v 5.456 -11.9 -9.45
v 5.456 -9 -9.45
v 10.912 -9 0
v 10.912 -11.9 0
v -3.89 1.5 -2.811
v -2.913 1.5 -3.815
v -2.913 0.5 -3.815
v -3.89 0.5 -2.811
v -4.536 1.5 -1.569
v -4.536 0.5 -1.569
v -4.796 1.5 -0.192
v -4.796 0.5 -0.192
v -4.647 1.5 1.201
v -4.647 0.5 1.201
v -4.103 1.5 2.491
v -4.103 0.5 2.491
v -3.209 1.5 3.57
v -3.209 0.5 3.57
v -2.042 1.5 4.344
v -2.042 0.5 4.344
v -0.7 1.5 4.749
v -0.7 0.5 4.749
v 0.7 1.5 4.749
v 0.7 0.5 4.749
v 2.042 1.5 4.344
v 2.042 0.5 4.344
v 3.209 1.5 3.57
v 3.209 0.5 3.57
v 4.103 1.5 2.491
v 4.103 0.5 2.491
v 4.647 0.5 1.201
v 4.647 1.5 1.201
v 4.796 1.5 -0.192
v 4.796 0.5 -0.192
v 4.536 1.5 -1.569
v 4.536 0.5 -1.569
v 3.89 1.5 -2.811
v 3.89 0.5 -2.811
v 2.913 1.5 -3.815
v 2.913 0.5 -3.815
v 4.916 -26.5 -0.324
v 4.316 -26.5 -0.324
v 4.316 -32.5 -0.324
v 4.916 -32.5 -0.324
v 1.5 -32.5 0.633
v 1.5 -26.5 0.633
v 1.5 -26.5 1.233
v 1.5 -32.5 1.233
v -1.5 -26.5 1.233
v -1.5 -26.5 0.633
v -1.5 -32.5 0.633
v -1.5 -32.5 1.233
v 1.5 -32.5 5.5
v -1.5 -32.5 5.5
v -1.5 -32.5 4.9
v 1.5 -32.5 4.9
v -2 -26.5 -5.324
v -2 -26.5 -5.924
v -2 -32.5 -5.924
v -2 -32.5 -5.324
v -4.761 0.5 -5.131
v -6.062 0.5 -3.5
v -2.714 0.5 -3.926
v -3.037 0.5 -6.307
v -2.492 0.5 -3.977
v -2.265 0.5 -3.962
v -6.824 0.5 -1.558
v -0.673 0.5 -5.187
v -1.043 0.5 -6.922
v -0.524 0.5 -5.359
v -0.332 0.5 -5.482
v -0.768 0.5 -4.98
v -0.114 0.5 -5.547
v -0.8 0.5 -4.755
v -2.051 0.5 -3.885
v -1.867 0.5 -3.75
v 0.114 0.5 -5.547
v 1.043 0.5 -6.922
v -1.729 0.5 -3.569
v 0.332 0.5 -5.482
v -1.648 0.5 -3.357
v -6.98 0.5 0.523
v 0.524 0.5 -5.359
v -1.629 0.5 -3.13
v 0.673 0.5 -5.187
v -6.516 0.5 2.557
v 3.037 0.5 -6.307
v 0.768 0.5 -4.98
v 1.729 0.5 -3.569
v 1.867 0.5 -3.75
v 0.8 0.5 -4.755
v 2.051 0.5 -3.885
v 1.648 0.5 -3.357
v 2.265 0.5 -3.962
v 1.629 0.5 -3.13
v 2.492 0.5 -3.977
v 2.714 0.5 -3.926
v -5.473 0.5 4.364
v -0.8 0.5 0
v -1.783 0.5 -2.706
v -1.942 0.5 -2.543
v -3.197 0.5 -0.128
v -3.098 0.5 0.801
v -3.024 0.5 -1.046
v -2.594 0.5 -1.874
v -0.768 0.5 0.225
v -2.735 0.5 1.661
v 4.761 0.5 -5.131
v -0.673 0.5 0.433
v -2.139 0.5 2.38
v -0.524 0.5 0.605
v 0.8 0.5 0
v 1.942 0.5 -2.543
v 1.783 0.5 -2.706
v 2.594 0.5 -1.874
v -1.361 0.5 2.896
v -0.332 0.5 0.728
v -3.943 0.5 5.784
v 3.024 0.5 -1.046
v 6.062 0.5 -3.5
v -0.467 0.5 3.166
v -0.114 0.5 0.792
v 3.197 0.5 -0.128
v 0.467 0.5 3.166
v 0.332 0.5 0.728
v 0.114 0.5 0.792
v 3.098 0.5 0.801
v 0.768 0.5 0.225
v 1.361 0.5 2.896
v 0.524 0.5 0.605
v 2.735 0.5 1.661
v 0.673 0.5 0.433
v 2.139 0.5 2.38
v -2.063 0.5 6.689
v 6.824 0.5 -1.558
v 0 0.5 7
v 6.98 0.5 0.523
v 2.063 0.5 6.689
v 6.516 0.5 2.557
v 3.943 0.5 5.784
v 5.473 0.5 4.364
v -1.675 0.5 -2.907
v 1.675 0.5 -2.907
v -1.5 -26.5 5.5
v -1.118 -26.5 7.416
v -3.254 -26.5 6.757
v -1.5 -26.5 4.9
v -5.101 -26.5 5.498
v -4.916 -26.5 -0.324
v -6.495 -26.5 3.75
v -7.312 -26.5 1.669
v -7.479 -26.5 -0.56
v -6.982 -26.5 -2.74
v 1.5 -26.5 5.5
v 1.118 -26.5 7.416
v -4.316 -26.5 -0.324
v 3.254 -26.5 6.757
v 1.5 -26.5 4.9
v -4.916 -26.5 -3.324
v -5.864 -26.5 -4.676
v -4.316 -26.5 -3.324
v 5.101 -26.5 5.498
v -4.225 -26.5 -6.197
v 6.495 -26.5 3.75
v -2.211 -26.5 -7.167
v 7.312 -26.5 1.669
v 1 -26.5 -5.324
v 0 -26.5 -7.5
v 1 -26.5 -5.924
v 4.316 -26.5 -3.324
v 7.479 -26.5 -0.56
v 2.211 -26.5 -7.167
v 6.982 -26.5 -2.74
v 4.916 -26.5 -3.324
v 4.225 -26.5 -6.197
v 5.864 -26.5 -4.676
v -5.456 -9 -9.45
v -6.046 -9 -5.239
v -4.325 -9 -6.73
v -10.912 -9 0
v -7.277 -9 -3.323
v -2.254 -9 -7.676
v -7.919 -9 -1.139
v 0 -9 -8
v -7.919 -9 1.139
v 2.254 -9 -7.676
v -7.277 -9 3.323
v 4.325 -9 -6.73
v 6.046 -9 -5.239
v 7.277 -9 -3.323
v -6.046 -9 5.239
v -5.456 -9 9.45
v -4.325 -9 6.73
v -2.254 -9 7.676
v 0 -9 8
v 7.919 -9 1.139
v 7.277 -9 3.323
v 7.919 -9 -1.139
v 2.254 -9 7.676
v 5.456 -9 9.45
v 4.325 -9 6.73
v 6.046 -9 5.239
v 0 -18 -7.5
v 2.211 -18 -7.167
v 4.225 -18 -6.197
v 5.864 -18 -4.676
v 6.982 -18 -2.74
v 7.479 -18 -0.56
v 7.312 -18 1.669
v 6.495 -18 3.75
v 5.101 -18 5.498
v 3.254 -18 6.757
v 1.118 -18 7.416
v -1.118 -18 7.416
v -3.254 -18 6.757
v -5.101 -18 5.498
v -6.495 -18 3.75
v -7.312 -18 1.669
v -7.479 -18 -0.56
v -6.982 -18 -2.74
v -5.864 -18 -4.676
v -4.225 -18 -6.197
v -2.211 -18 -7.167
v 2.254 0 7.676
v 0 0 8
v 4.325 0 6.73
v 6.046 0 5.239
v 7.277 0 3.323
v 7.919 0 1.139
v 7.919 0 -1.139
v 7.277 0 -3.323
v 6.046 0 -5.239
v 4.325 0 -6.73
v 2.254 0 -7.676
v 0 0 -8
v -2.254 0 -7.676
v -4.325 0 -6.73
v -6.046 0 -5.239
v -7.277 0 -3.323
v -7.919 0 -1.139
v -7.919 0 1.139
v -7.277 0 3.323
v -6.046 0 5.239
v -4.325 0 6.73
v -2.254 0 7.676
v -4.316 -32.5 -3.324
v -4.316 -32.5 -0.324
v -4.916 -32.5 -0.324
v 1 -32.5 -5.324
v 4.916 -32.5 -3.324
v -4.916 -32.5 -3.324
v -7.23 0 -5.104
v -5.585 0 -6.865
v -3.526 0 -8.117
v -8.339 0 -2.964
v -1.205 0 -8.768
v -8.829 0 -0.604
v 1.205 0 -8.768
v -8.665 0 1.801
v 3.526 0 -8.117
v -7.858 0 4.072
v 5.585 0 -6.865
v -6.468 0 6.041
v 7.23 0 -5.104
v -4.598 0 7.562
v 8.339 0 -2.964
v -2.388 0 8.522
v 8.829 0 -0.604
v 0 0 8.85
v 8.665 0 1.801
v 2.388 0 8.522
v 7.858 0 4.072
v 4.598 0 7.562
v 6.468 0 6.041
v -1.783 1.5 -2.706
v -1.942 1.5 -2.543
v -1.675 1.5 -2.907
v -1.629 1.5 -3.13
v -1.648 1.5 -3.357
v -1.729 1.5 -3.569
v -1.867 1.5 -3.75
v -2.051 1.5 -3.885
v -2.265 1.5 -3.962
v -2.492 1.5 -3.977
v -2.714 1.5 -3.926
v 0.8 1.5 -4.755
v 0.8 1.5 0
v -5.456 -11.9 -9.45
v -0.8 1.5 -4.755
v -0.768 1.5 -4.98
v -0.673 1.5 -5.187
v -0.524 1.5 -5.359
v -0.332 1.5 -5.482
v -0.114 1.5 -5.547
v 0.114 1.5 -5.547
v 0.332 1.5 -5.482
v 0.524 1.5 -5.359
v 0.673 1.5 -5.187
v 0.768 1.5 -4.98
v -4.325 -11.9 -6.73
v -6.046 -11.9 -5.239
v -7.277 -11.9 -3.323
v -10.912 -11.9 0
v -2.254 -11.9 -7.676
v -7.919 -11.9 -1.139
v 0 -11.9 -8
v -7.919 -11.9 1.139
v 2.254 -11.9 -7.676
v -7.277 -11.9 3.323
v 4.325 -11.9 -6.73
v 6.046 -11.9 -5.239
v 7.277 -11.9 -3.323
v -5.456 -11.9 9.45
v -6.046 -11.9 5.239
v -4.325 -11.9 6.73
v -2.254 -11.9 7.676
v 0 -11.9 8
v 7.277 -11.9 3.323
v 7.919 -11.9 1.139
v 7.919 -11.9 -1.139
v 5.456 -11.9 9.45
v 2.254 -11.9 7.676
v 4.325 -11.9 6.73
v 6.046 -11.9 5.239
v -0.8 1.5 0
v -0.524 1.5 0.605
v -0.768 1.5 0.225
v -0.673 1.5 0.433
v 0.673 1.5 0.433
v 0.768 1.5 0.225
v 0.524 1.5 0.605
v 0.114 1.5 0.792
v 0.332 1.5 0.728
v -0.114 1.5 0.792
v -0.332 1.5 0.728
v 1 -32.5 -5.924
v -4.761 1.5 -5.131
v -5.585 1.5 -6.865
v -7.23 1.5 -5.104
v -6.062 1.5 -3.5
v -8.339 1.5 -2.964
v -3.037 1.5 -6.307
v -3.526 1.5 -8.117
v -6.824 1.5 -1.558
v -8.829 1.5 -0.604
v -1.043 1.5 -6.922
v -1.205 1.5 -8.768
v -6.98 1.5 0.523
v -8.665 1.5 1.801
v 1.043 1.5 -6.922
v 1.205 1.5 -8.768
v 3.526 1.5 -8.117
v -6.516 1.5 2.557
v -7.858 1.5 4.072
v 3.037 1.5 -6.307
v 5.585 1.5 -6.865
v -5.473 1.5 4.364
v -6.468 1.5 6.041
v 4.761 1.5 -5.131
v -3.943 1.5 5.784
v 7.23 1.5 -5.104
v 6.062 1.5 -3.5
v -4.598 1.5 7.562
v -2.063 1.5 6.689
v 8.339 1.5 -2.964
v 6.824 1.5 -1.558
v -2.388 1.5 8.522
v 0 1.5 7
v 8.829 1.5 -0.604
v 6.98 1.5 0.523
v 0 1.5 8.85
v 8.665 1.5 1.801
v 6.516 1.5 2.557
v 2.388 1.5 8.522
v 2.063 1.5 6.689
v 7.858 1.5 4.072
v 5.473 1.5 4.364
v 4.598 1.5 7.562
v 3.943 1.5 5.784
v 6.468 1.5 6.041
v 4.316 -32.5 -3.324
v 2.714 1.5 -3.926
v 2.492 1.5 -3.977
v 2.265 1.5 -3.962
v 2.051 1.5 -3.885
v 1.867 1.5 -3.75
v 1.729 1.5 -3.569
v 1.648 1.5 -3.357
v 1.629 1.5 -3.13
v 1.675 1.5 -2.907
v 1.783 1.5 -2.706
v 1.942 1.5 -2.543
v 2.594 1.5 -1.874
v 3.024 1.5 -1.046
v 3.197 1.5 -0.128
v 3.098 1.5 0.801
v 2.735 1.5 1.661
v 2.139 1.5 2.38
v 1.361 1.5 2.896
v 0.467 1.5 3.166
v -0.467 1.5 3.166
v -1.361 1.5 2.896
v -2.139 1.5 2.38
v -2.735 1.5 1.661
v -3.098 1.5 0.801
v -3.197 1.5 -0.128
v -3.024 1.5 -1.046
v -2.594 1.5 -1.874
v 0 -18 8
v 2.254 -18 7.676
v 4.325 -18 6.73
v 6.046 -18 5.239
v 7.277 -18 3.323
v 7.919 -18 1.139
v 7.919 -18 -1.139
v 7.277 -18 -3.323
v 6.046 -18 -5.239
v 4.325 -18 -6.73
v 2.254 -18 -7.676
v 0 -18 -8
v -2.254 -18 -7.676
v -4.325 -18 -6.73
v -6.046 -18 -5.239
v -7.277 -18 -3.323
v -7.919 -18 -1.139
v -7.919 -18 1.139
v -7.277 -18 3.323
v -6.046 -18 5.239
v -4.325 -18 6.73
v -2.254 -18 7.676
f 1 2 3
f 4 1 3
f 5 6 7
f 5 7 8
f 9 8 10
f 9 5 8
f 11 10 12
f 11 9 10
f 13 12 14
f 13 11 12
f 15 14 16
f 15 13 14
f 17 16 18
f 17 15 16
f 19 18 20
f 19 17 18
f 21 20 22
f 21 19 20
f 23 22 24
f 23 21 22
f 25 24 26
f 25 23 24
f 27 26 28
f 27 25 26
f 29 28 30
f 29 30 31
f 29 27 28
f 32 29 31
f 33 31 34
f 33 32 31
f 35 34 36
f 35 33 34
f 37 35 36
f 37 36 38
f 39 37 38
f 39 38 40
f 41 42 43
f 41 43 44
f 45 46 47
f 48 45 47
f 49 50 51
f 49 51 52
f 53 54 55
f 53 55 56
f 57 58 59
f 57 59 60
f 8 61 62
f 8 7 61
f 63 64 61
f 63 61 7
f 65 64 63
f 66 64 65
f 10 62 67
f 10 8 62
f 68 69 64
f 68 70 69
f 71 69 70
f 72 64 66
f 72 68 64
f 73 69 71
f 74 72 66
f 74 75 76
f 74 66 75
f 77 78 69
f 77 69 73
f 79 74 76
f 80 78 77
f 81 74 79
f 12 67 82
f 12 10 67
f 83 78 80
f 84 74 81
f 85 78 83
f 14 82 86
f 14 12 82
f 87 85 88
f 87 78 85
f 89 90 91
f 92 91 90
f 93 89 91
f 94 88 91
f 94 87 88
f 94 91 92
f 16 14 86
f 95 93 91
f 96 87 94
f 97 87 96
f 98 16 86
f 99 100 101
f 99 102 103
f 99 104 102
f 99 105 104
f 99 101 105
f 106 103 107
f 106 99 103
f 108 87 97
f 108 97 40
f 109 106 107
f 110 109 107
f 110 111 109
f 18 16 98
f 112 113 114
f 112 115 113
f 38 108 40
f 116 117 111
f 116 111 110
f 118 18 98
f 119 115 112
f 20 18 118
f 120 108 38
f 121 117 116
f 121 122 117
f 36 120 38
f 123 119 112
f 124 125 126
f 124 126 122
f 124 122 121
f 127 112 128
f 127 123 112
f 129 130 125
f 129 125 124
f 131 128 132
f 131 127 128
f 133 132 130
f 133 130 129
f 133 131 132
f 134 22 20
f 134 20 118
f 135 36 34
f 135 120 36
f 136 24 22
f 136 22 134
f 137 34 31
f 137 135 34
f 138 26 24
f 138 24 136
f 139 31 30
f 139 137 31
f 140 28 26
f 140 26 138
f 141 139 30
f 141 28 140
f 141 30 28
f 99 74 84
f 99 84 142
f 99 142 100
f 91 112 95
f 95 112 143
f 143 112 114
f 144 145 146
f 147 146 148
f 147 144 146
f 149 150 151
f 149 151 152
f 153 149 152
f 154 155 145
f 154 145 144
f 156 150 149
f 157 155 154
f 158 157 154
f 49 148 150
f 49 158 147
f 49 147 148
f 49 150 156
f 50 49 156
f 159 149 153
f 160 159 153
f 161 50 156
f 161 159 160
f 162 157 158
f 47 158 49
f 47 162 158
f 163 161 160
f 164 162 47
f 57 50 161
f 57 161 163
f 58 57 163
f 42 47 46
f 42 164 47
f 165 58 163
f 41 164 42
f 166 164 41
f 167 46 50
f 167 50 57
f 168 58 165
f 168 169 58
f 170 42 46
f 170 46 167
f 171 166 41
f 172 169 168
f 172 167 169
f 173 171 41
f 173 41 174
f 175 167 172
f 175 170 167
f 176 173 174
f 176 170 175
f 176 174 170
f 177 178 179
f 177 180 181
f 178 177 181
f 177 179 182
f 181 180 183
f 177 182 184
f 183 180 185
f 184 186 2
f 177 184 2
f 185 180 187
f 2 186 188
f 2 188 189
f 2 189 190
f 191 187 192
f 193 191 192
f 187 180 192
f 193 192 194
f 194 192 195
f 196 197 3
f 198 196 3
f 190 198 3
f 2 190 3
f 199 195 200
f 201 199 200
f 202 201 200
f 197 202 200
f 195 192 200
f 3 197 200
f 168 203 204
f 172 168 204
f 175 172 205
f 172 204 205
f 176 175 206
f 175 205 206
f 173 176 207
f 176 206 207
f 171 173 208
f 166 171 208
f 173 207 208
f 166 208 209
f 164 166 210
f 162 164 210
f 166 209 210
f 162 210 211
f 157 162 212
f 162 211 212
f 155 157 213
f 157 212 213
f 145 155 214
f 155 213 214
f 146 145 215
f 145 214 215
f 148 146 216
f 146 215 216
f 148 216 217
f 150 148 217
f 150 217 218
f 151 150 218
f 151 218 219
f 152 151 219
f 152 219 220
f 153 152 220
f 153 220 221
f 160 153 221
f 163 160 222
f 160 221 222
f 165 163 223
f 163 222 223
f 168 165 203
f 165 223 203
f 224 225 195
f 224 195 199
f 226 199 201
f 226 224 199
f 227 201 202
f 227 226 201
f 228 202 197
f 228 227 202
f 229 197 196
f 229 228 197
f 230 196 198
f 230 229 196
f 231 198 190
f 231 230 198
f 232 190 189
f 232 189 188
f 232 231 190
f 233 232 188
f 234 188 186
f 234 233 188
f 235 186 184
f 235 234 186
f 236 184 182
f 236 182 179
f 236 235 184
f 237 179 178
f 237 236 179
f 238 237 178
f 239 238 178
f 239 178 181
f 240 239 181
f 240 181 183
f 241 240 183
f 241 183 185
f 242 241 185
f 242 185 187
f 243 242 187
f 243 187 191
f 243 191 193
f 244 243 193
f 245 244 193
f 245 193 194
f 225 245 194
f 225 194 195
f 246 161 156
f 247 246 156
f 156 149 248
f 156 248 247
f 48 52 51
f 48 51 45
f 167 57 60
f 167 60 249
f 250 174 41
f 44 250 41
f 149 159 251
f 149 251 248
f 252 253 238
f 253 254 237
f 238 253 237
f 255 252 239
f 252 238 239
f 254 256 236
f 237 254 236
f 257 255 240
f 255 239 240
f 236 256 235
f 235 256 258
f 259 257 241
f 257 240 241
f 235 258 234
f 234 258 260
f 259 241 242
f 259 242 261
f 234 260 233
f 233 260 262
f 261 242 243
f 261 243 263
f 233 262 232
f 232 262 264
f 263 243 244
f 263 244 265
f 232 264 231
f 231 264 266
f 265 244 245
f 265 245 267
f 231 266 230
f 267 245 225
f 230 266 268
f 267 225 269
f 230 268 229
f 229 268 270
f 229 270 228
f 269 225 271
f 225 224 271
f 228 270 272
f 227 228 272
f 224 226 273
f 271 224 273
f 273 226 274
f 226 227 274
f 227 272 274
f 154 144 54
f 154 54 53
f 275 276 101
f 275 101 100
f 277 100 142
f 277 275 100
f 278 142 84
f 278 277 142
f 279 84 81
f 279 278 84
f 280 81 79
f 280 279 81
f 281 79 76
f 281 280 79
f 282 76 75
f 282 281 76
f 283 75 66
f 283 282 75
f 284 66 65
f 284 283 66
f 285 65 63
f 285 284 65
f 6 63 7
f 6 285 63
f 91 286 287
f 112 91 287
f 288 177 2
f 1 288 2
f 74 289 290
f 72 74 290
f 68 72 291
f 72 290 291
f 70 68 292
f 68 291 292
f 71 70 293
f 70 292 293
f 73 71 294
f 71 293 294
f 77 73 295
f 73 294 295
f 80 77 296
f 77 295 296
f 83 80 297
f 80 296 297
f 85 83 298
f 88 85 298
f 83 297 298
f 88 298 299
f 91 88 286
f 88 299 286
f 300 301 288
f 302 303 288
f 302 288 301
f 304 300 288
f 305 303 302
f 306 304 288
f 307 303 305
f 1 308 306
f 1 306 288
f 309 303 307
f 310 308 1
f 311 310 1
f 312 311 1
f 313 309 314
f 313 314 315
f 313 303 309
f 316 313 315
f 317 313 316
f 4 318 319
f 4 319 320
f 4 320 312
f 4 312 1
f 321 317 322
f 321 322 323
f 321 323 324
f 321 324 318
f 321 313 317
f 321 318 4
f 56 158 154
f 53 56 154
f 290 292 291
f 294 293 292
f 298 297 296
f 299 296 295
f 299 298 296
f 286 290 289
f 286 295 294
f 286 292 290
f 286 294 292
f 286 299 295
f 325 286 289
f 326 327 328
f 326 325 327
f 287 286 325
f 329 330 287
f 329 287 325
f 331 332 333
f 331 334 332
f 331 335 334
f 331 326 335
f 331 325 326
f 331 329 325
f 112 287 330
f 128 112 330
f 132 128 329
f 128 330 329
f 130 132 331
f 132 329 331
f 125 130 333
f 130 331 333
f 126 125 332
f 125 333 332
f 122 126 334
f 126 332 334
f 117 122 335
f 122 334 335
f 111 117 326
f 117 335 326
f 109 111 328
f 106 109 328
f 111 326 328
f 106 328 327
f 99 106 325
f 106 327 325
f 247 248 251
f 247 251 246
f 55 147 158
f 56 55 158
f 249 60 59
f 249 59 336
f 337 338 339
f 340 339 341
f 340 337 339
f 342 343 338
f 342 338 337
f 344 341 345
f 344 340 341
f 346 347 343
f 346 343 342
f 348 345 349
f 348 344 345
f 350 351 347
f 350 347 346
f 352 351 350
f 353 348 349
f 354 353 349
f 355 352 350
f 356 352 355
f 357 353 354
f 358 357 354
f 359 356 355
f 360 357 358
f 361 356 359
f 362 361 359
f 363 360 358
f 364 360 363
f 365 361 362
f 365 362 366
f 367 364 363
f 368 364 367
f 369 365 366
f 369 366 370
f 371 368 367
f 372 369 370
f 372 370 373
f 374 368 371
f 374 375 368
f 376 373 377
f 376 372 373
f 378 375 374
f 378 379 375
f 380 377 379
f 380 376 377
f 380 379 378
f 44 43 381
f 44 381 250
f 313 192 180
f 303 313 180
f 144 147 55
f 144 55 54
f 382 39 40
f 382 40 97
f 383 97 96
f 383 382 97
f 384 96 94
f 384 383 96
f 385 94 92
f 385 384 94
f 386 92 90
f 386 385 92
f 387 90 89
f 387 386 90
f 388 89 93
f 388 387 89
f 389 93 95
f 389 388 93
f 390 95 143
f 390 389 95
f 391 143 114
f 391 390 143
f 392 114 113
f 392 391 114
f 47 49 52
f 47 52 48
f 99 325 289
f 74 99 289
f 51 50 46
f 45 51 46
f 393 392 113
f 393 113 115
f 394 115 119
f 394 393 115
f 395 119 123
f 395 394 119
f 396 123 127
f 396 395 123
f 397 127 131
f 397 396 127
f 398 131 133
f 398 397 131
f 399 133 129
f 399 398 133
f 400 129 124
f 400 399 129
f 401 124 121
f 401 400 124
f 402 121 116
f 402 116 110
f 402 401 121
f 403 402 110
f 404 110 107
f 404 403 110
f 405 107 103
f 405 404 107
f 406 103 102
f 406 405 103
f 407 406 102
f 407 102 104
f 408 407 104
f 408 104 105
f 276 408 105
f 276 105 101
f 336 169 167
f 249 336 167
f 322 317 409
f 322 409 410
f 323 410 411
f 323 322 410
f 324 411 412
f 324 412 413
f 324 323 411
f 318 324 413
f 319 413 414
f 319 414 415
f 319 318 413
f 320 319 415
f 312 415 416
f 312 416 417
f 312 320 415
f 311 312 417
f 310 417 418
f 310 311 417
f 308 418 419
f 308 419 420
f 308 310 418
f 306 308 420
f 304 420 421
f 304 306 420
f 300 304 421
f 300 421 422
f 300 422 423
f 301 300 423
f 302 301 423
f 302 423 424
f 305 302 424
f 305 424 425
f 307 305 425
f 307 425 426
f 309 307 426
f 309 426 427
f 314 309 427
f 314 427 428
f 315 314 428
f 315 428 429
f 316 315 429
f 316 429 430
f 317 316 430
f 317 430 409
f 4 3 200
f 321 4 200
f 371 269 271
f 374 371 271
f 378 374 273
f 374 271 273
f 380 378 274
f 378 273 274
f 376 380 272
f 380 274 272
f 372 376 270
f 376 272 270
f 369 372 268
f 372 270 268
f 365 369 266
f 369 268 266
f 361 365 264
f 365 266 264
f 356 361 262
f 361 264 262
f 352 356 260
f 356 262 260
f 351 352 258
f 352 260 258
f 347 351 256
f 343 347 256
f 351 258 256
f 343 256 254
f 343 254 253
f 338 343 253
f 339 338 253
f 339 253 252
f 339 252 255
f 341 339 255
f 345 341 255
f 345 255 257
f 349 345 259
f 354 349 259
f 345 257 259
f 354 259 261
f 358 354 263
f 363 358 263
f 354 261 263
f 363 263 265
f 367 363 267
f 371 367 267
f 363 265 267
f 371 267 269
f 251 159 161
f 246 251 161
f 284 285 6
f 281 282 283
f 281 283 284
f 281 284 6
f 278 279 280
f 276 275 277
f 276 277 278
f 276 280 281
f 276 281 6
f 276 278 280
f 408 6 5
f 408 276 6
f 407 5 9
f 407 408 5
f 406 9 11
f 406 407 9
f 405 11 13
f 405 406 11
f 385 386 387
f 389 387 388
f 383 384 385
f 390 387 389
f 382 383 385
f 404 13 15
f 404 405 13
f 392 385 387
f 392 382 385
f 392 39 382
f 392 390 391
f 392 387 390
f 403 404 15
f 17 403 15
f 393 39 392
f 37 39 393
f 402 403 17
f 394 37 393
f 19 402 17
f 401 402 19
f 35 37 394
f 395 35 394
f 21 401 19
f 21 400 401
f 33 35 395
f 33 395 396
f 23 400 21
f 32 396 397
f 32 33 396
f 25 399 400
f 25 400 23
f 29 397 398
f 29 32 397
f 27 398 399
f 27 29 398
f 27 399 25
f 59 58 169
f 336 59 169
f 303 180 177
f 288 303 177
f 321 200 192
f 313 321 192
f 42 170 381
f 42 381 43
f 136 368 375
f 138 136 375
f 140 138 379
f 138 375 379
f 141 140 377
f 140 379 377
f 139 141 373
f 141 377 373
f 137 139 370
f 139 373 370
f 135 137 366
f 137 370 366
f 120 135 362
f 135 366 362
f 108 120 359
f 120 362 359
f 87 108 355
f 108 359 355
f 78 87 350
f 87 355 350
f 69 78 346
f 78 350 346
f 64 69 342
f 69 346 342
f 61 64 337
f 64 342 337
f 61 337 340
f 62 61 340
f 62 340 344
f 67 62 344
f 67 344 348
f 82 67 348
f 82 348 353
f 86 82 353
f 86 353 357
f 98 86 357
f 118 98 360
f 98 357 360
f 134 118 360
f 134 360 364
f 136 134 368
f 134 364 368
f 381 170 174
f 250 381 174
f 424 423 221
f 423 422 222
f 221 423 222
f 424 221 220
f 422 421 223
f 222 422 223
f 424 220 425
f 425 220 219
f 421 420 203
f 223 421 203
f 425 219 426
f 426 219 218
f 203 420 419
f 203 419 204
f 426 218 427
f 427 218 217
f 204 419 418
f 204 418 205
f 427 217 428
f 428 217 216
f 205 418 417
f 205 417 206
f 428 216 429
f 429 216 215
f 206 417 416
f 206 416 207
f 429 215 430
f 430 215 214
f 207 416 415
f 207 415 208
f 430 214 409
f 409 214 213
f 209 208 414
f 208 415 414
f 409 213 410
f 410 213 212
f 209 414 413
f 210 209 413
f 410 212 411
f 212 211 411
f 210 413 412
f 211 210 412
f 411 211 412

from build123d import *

# Parameters (mm, degrees)
ESQUISSE1_R             = 8
BOSS_EXTRU_1_DEPTH      = 18
ESQUISSE2_R             = 8.85
BOSS_EXTRU_2_DEPTH      = 1.5
ESQUISSE3_R             = 7
ENL_V_MAT_EXTRU_1_DEPTH = 1
ESQUISSE4_R             = 7.5
BOSS_EXTRU_3_DEPTH      = 8.5
ESQUISSE5_W             = 0.6
ESQUISSE5_H             = 3
ESQUISSE5_W_2           = 3
ESQUISSE5_H_2           = 0.6
BOSS_EXTRU_4_DEPTH      = 6
BOSS_EXTRU_5_START      = 9
BOSS_EXTRU_5_DEPTH      = 2.9


with BuildPart() as part:
    # Esquisse1 → Boss.-Extru.1 (new body)
    with BuildSketch(Plane(origin=(0, 0, 0), x_dir=(1, 0, 0), z_dir=(0, 1, 0))):
        with Locations(Location((0, 0, 0), (0, 0, 270))):
            Circle(ESQUISSE1_R)
    extrude(amount=-BOSS_EXTRU_1_DEPTH)

    # Esquisse2 → Boss.-Extru.2 (add)
    with BuildSketch(Plane(origin=(0, 0, 0), x_dir=(1, 0, 0), z_dir=(0, 1, 0))):
        with Locations(Location((0, 0, 0), (0, 0, 270))):
            Circle(ESQUISSE2_R)
    extrude(amount=BOSS_EXTRU_2_DEPTH)

    # Esquisse3 → Enlèv. mat.-Extru.1 (cut)
    with BuildSketch(Plane(origin=(0, 1.5, 0), x_dir=(1, 0, 0), z_dir=(0, 1, 0))):
        with Locations(Location((0, 0, 0), (0, 0, 270))):
            Circle(ESQUISSE3_R)
        with BuildLine():
            Line((-0.8, 0), (-0.8, 4.75466628))
            ThreePointArc((-0.8, 4.75466628), (0, 5.55466628), (0.8, 4.75466628))
            Line((0.8, 4.75466628), (0.8, 0))
            ThreePointArc((0.8, 0), (0, -0.8), (-0.8, 0))
        make_face(mode=Mode.SUBTRACT)
        with BuildLine():
            ThreePointArc((-2.913082643, 3.814963894), (0, -4.8), (2.913082643, 3.814963894))
            ThreePointArc((2.913082643, 3.814963894), (1.791741554, 3.664650352), (1.942055095, 2.543309263))
            ThreePointArc((1.942055095, 2.543309263), (0, -3.2), (-1.942055095, 2.543309263))
            ThreePointArc((-1.942055095, 2.543309263), (-1.791741554, 3.664650352), (-2.913082643, 3.814963894))
        make_face(mode=Mode.SUBTRACT)
    extrude(amount=-ENL_V_MAT_EXTRU_1_DEPTH, mode=Mode.SUBTRACT)

    # Esquisse4 → Boss.-Extru.3 (add)
    with BuildSketch(Plane.XZ.offset(18)):
        with Locations(Location((0, 0, 0), (0, 0, 270))):
            Circle(ESQUISSE4_R)
    extrude(amount=BOSS_EXTRU_3_DEPTH)

    # Esquisse5 → Boss.-Extru.4 (add)
    with BuildSketch(Plane.XZ.offset(26.5)):
        with Locations((-4.616296437, -1.823639602)):
            Rectangle(ESQUISSE5_W, ESQUISSE5_H)
        with Locations((0, 5.19973439)):
            Rectangle(ESQUISSE5_W_2, ESQUISSE5_H_2)
        with Locations((4.616296437, -1.823639602)):
            Rectangle(ESQUISSE5_W, ESQUISSE5_H)
        with Locations((0, 0.93263523)):
            Rectangle(ESQUISSE5_W_2, ESQUISSE5_H_2)
        with Locations((-0.5, -5.623689166)):
            Rectangle(ESQUISSE5_W_2, ESQUISSE5_H_2)
    extrude(amount=BOSS_EXTRU_4_DEPTH)

    # Esquisse6 → Boss.-Extru.5 (add)
    with BuildSketch(Plane.XZ.offset(BOSS_EXTRU_5_START)):
        Polygon((10.911920088, 0), (5.455960044, 9.45), (-5.455960044, 9.45), (-10.911920088, 0), (-5.455960044, -9.45), (5.455960044, -9.45), align=None)
    extrude(amount=BOSS_EXTRU_5_DEPTH)


solid = part.part
